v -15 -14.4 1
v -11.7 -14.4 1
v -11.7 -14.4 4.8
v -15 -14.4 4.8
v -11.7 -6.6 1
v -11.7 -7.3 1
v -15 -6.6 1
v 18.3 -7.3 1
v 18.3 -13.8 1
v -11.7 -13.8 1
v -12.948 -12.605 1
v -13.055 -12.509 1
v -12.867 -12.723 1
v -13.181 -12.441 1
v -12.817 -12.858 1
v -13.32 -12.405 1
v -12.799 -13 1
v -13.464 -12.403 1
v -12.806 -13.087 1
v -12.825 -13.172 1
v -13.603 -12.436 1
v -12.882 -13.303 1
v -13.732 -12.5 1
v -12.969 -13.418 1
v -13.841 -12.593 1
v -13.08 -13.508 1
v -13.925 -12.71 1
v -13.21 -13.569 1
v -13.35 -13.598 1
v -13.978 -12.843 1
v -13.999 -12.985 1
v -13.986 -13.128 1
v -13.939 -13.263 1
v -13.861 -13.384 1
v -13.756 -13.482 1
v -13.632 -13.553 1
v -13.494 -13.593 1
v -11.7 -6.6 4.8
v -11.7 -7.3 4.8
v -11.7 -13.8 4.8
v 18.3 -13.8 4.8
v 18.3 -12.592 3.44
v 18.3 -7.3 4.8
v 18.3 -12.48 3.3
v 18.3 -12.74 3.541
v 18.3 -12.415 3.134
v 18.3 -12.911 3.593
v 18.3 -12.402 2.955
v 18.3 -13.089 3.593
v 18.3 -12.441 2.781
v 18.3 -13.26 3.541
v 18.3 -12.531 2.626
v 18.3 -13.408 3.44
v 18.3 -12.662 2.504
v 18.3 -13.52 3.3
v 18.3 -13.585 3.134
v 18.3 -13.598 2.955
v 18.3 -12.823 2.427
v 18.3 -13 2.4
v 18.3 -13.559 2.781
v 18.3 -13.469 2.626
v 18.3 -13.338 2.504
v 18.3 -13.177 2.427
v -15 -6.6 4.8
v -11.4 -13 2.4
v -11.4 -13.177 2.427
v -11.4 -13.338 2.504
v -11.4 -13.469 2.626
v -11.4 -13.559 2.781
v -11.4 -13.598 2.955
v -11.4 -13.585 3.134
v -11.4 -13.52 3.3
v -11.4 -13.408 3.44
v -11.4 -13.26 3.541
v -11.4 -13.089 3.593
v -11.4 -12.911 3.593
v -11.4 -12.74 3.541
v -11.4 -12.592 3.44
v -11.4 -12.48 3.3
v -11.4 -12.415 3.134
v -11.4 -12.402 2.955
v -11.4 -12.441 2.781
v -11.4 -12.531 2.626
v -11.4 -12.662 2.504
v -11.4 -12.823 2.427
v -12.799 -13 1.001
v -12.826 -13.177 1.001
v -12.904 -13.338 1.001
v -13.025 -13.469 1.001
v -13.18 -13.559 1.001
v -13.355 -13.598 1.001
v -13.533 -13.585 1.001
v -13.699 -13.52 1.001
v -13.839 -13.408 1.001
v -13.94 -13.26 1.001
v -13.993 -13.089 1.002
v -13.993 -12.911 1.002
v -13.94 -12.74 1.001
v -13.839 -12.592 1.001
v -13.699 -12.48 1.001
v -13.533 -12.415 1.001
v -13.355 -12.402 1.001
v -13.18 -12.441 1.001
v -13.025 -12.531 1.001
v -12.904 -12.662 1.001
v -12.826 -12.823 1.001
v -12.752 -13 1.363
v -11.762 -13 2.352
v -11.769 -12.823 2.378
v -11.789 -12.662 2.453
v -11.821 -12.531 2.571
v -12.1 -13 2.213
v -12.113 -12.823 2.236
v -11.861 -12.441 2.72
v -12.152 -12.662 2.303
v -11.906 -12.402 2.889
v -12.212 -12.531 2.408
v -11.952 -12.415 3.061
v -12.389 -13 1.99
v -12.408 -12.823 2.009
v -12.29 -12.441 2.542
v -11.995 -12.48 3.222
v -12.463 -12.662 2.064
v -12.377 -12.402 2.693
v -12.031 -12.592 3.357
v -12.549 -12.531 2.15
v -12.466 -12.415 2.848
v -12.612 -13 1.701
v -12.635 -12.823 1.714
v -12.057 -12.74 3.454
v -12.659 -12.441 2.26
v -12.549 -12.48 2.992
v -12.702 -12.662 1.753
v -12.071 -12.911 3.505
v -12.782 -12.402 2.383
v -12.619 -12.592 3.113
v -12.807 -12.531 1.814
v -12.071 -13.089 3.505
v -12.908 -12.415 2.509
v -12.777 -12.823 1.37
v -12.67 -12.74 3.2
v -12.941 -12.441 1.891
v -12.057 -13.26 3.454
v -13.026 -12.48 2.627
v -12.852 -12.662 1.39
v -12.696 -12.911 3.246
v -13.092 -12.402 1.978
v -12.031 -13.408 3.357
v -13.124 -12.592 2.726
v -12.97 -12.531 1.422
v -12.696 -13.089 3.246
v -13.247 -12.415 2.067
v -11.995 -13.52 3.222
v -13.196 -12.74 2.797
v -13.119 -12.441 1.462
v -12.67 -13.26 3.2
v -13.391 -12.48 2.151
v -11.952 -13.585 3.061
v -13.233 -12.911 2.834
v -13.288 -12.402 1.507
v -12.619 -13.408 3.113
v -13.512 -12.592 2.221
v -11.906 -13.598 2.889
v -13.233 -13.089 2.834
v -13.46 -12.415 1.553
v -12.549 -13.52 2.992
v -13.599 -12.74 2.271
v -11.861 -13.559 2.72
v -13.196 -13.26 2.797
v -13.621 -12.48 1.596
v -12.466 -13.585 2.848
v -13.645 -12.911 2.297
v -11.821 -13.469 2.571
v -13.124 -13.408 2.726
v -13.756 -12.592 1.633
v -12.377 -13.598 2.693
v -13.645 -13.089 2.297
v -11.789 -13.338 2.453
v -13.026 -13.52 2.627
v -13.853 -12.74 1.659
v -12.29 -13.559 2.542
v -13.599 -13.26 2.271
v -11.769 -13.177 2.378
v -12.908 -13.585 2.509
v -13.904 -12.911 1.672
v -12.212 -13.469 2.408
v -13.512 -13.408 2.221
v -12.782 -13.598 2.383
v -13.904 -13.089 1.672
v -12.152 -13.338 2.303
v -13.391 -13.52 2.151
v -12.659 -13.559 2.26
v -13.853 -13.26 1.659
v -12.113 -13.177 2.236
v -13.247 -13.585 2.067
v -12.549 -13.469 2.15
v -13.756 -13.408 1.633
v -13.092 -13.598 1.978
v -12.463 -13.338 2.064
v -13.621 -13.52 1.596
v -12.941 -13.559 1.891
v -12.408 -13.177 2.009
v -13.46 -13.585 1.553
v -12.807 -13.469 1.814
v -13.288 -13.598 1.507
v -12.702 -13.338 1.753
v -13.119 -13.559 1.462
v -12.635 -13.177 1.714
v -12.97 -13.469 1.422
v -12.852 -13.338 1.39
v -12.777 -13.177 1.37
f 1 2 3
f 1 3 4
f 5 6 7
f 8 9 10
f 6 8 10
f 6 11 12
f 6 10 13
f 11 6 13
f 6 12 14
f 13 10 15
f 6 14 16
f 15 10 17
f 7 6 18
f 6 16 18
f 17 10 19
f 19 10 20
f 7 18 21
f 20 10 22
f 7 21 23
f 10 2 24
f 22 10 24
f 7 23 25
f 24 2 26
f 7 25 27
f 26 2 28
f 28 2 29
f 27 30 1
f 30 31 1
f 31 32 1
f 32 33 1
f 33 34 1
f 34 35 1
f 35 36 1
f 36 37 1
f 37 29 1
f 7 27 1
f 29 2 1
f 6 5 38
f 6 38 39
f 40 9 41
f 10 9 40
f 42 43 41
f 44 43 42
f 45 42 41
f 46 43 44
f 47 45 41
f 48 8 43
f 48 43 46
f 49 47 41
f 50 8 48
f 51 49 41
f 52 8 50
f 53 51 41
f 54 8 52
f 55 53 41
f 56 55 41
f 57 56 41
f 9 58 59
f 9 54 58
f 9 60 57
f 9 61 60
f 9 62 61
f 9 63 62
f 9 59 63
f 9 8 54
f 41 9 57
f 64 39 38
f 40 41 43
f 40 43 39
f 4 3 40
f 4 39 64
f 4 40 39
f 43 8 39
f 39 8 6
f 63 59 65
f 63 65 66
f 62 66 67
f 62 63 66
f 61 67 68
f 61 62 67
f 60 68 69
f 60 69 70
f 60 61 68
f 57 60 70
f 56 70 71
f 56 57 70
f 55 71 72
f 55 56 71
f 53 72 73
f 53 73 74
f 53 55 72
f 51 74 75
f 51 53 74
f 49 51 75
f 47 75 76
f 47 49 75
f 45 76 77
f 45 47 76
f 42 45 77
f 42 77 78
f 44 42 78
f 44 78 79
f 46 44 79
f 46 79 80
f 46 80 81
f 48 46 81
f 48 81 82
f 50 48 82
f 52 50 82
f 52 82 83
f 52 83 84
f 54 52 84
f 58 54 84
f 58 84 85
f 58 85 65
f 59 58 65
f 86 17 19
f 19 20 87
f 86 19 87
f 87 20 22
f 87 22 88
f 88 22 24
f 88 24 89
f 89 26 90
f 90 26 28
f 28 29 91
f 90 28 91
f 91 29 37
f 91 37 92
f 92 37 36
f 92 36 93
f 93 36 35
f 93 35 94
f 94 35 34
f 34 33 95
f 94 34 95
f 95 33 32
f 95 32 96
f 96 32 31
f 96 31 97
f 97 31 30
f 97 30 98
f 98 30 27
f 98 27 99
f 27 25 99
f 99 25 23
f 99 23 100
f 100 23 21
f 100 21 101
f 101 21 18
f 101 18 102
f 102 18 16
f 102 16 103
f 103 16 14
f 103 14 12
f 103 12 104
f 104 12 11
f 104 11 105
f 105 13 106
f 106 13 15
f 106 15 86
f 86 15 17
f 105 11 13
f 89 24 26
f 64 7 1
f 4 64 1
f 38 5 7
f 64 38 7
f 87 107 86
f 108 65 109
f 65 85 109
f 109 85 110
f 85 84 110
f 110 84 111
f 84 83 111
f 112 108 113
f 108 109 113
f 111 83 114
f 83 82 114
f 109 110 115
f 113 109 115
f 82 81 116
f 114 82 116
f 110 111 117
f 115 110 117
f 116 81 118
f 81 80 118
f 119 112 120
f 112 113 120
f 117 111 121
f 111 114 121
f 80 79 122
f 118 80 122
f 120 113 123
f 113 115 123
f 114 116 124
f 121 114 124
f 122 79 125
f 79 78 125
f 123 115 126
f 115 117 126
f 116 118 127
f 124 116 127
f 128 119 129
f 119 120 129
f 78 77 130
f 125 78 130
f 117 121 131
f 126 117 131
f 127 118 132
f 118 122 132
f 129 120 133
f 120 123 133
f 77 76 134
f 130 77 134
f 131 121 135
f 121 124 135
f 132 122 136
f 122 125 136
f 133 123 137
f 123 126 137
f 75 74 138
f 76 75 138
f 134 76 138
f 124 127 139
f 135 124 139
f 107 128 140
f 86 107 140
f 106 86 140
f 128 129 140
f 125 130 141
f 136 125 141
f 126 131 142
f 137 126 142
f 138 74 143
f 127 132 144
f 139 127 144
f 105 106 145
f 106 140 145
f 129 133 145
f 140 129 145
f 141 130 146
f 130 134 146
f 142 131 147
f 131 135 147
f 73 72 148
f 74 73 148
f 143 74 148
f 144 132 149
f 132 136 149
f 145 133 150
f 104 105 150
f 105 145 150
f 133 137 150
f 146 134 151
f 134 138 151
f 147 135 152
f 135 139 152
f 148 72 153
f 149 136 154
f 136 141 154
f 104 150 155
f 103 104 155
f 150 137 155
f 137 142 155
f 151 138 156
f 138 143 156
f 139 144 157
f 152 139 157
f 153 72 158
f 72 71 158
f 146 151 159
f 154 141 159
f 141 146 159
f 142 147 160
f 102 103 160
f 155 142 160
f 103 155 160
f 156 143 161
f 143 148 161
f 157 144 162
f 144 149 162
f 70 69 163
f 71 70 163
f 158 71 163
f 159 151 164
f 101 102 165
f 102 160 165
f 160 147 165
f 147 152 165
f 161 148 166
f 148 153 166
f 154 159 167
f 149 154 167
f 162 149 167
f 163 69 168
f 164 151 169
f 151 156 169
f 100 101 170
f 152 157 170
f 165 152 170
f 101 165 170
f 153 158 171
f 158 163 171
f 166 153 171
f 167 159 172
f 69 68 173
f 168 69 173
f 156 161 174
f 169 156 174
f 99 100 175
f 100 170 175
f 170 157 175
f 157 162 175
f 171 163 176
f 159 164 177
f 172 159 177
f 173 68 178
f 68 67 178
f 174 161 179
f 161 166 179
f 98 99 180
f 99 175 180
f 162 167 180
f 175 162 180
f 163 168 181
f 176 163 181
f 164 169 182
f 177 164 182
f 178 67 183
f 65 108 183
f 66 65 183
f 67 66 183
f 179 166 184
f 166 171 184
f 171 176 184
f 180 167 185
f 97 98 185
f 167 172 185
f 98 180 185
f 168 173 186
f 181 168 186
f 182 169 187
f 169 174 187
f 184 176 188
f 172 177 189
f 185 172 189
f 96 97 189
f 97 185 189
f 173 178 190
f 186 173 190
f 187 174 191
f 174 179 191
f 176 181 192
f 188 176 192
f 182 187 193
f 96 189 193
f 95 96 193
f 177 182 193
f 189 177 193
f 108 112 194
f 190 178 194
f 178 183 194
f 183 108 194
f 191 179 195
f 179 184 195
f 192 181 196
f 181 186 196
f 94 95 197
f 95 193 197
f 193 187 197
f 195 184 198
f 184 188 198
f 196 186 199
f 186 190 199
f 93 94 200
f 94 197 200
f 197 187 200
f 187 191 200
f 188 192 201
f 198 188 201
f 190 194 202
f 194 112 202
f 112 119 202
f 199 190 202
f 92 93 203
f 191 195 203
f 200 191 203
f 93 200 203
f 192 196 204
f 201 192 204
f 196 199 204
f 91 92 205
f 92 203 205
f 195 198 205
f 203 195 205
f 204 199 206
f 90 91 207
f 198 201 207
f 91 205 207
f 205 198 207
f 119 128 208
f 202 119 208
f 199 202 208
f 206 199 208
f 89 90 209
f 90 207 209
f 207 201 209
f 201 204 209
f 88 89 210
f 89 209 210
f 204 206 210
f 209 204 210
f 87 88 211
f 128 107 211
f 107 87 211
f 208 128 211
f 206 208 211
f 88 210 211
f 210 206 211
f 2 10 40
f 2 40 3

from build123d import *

# Parameters (mm, degrees)
SKETCH004_R             = 0.6
SWEEP_ROLL_ANGLE        = -90
CYLINDER006_R           = 0.6
CYLINDER006_DEPTH       = 30
CYLINDER006_PITCH_ANGLE = 90
BOX013_W                = 3.3
BOX013_H                = 7.8
BOX013_DEPTH            = 3.8
BOX012_W                = 30
BOX012_H                = 6.5
BOX012_DEPTH            = 3.8
CUT004_PLACEMENT_ANGLE  = 180


with BuildPart() as sweep_body:
    # Sweep: sweep along a path in Sketch002
    with BuildLine(Plane.XY) as sweep_path:
        Line((0, 0), (2.000007, 0))
        ThreePointArc((2.000007, 0), (3.413537, 0.585387), (3.999404, 1.998718))
        Line((3.999404, 1.998718), (3.999404, 3.99963))
    # Sketch004 → Sweep (sweep)
    with BuildSketch(Plane.YZ):
        Circle(SKETCH004_R)
    sweep(path=sweep_path.line, transition=Transition.RIGHT)


with BuildPart() as sweep_body_1:
    # Sweep roll: moved
    add(sweep_body.part.rotate(Axis((0, 0, 0), (1, 0, 0)), SWEEP_ROLL_ANGLE))


with BuildPart() as sweep_body_2:
    # Sweep placement: moved
    add(sweep_body_1.part.moved(Location((11, 3.4, 2))))


with BuildPart() as fusion002005:
    # Cylinder006 → Cylinder006 (new body)
    with BuildSketch(Plane.XY):
        Circle(CYLINDER006_R)
    extrude(amount=CYLINDER006_DEPTH)


with BuildPart() as fusion002005_1:
    # Cylinder006 pitch: moved
    add(fusion002005.part.rotate(Axis((0, 0, 0), (0, 1, 0)), CYLINDER006_PITCH_ANGLE))


with BuildPart() as fusion002005_2:
    # Cylinder006 placement: moved
    add(fusion002005_1.part.moved(Location((-17, 3.4, 2))))

    # Fusion002005: union Sweep body
    add(sweep_body_2.part)


with BuildPart() as fusion002005_3:
    # Fusion002005 placement: moved
    add(fusion002005_2.part.moved(Location((-1.3, 2.5, 0))))


with BuildPart() as cubo013:
    # Box013 → Box013 (new body)
    with BuildSketch(Plane(origin=(12, -0.5, 0), x_dir=(1, 0, 0), z_dir=(0, 0, 1))):
        with Locations((1.65, 3.9)):
            Rectangle(BOX013_W, BOX013_H)
    extrude(amount=BOX013_DEPTH)


with BuildPart() as cut004:
    # Box012 → Box012 (new body)
    with BuildSketch(Plane(origin=(-18, 0.2, 0), x_dir=(1, 0, 0), z_dir=(0, 0, 1))):
        with Locations((15, 3.25)):
            Rectangle(BOX012_W, BOX012_H)
    extrude(amount=BOX012_DEPTH)

    # Fusion002004: union Cubo013
    add(cubo013.part)

    # Cut004: cut Fusion002005
    add(fusion002005_3.part, mode=Mode.SUBTRACT)


with BuildPart() as cut004_1:
    # Cut004 placement: moved
    add(cut004.part.moved(Location((0.3, -7.1, 1))).rotate(Axis((0.3, -7.1, 1), (0, 0, 1)), CUT004_PLACEMENT_ANGLE))


solid = cut004_1.part
